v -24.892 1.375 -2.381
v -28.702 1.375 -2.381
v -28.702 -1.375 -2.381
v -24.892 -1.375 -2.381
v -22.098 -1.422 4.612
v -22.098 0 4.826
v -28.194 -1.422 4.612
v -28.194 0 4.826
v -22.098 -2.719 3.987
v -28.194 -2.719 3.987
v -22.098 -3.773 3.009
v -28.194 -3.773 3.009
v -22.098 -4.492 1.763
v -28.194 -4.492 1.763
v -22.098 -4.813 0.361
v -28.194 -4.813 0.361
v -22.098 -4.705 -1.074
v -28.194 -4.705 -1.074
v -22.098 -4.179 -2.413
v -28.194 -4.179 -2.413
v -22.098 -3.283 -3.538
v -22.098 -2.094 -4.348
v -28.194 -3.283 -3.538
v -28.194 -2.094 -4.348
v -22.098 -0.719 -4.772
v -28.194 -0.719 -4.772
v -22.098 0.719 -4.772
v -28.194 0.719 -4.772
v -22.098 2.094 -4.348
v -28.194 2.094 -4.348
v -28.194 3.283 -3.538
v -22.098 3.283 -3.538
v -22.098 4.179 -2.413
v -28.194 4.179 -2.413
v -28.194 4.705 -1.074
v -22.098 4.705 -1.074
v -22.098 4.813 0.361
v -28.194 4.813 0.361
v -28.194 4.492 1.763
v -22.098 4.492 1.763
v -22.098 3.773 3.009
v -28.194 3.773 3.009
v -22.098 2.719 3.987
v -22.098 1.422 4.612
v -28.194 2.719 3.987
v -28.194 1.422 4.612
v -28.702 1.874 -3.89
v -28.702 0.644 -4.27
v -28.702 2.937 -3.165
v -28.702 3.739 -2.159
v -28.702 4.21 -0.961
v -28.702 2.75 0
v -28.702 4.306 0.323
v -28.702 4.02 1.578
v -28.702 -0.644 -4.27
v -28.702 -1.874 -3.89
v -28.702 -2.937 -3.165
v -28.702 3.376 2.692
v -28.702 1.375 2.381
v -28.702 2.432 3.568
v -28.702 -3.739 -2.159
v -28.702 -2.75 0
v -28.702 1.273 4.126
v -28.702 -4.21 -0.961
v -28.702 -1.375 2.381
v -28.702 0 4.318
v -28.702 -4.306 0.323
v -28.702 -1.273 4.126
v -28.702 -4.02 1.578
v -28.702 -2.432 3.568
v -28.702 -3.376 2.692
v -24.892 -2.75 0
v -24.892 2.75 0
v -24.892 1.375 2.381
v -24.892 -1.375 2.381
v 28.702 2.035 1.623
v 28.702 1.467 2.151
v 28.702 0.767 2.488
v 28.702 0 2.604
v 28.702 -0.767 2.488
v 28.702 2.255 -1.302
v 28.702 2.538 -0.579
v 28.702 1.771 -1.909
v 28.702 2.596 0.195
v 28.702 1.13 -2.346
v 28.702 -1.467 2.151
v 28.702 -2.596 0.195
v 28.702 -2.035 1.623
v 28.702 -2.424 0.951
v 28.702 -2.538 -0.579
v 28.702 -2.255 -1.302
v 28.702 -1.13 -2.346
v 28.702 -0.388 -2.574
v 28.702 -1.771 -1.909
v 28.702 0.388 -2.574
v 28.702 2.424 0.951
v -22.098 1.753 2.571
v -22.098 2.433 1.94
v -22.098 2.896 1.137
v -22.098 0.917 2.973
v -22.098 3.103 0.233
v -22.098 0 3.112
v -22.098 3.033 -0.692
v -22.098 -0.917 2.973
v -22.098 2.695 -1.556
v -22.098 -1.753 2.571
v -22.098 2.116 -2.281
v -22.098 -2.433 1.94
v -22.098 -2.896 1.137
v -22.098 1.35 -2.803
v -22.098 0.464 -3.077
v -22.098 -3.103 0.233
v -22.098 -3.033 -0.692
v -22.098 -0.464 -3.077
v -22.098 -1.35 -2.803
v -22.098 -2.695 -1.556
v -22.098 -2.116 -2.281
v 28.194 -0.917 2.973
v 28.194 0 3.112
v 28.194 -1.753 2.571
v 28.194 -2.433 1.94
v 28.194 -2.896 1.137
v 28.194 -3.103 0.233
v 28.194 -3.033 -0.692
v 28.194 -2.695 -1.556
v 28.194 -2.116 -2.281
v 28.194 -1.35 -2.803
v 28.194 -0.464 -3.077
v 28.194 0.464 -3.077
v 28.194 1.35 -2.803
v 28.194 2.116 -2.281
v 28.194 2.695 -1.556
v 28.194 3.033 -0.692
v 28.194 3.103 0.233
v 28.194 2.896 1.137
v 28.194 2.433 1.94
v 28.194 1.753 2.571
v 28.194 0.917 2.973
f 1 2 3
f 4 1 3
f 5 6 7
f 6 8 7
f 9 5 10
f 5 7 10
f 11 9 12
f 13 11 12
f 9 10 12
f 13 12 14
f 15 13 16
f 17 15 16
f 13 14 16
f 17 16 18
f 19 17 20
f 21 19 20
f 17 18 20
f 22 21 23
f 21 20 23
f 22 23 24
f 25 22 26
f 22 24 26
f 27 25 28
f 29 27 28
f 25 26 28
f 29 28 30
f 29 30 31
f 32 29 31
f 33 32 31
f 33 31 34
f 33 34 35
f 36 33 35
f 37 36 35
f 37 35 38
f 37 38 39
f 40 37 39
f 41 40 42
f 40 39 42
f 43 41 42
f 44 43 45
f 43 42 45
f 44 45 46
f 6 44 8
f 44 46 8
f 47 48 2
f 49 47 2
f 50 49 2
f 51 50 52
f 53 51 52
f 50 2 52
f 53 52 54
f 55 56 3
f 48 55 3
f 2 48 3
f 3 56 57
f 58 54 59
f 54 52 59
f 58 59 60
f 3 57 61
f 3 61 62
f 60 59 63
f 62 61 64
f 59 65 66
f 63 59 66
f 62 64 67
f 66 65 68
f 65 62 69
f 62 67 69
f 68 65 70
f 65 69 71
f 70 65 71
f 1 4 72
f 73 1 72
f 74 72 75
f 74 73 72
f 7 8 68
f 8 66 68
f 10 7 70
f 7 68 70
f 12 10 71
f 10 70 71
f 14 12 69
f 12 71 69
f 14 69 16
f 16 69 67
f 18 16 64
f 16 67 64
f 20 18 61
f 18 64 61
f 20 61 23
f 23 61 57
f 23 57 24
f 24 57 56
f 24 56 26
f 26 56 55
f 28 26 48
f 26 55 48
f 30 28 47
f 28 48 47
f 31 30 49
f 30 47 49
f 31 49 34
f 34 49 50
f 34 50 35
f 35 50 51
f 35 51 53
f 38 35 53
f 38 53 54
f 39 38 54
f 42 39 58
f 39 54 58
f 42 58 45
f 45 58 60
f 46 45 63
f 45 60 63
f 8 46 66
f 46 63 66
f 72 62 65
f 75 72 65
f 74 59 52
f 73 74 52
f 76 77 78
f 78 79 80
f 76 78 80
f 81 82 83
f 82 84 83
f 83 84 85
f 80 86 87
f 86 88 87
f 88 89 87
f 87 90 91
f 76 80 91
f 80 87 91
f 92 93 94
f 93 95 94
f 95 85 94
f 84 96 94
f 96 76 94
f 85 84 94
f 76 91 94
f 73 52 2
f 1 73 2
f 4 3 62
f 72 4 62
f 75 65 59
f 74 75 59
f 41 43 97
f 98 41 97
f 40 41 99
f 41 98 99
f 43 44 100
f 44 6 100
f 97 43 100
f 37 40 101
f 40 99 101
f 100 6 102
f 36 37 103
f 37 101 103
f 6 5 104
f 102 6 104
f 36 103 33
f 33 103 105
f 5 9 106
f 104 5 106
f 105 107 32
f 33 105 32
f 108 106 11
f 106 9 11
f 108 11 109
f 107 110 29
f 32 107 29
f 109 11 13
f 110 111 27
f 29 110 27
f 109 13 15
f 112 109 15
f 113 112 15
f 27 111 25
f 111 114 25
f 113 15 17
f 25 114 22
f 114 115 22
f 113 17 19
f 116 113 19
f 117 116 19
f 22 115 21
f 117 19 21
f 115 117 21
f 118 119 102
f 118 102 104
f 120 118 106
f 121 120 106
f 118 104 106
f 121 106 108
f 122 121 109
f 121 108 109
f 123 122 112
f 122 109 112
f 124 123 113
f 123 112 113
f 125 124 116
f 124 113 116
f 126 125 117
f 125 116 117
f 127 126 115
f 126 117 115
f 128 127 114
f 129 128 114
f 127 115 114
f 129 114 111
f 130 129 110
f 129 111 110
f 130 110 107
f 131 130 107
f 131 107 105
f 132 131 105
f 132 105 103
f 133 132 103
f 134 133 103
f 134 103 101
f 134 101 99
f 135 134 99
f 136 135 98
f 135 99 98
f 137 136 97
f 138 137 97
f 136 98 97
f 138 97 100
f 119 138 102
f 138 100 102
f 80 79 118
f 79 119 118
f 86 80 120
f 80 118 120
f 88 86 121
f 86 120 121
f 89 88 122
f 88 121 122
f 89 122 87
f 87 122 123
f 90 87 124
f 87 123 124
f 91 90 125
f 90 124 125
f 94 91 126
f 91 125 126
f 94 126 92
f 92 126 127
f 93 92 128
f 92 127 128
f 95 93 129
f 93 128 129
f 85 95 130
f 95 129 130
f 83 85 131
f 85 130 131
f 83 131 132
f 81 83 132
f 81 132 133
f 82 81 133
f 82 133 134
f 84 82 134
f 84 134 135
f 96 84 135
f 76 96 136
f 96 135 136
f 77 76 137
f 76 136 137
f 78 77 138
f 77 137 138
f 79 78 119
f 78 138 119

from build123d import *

# Parameters (mm, degrees)
EXTRUDE1_DEPTH = 3.81


with BuildPart() as part:
    # Sketch1 → Revolve1 (revolve)
    with BuildSketch(Plane.XY, mode=Mode.PRIVATE) as revolve1_sk:
        Polygon((28.702, 0), (28.702, 2.6035), (28.194, 3.1115), (-22.098, 3.1115), (-22.098, 4.826), (-28.194, 4.826), (-28.702, 4.318), (-28.702, 0), align=None)
    revolve(revolve1_sk.sketch.rotate(Axis((-40.759022879, 0, 0), (1, 0, 0)), 90), axis=Axis((-40.759022879, 0, 0), (1, 0, 0)))

    # Sketch2 → Extrude1 (cut)
    with BuildSketch(Plane.ZY.offset(28.702)):
        Polygon((0, 2.749630657), (-2.38125, 1.374815329), (-2.38125, -1.374815329), (0, -2.749630657), (2.38125, -1.374815329), (2.38125, 1.374815329), align=None)
    extrude(amount=-EXTRUDE1_DEPTH, mode=Mode.SUBTRACT)


solid = part.part
